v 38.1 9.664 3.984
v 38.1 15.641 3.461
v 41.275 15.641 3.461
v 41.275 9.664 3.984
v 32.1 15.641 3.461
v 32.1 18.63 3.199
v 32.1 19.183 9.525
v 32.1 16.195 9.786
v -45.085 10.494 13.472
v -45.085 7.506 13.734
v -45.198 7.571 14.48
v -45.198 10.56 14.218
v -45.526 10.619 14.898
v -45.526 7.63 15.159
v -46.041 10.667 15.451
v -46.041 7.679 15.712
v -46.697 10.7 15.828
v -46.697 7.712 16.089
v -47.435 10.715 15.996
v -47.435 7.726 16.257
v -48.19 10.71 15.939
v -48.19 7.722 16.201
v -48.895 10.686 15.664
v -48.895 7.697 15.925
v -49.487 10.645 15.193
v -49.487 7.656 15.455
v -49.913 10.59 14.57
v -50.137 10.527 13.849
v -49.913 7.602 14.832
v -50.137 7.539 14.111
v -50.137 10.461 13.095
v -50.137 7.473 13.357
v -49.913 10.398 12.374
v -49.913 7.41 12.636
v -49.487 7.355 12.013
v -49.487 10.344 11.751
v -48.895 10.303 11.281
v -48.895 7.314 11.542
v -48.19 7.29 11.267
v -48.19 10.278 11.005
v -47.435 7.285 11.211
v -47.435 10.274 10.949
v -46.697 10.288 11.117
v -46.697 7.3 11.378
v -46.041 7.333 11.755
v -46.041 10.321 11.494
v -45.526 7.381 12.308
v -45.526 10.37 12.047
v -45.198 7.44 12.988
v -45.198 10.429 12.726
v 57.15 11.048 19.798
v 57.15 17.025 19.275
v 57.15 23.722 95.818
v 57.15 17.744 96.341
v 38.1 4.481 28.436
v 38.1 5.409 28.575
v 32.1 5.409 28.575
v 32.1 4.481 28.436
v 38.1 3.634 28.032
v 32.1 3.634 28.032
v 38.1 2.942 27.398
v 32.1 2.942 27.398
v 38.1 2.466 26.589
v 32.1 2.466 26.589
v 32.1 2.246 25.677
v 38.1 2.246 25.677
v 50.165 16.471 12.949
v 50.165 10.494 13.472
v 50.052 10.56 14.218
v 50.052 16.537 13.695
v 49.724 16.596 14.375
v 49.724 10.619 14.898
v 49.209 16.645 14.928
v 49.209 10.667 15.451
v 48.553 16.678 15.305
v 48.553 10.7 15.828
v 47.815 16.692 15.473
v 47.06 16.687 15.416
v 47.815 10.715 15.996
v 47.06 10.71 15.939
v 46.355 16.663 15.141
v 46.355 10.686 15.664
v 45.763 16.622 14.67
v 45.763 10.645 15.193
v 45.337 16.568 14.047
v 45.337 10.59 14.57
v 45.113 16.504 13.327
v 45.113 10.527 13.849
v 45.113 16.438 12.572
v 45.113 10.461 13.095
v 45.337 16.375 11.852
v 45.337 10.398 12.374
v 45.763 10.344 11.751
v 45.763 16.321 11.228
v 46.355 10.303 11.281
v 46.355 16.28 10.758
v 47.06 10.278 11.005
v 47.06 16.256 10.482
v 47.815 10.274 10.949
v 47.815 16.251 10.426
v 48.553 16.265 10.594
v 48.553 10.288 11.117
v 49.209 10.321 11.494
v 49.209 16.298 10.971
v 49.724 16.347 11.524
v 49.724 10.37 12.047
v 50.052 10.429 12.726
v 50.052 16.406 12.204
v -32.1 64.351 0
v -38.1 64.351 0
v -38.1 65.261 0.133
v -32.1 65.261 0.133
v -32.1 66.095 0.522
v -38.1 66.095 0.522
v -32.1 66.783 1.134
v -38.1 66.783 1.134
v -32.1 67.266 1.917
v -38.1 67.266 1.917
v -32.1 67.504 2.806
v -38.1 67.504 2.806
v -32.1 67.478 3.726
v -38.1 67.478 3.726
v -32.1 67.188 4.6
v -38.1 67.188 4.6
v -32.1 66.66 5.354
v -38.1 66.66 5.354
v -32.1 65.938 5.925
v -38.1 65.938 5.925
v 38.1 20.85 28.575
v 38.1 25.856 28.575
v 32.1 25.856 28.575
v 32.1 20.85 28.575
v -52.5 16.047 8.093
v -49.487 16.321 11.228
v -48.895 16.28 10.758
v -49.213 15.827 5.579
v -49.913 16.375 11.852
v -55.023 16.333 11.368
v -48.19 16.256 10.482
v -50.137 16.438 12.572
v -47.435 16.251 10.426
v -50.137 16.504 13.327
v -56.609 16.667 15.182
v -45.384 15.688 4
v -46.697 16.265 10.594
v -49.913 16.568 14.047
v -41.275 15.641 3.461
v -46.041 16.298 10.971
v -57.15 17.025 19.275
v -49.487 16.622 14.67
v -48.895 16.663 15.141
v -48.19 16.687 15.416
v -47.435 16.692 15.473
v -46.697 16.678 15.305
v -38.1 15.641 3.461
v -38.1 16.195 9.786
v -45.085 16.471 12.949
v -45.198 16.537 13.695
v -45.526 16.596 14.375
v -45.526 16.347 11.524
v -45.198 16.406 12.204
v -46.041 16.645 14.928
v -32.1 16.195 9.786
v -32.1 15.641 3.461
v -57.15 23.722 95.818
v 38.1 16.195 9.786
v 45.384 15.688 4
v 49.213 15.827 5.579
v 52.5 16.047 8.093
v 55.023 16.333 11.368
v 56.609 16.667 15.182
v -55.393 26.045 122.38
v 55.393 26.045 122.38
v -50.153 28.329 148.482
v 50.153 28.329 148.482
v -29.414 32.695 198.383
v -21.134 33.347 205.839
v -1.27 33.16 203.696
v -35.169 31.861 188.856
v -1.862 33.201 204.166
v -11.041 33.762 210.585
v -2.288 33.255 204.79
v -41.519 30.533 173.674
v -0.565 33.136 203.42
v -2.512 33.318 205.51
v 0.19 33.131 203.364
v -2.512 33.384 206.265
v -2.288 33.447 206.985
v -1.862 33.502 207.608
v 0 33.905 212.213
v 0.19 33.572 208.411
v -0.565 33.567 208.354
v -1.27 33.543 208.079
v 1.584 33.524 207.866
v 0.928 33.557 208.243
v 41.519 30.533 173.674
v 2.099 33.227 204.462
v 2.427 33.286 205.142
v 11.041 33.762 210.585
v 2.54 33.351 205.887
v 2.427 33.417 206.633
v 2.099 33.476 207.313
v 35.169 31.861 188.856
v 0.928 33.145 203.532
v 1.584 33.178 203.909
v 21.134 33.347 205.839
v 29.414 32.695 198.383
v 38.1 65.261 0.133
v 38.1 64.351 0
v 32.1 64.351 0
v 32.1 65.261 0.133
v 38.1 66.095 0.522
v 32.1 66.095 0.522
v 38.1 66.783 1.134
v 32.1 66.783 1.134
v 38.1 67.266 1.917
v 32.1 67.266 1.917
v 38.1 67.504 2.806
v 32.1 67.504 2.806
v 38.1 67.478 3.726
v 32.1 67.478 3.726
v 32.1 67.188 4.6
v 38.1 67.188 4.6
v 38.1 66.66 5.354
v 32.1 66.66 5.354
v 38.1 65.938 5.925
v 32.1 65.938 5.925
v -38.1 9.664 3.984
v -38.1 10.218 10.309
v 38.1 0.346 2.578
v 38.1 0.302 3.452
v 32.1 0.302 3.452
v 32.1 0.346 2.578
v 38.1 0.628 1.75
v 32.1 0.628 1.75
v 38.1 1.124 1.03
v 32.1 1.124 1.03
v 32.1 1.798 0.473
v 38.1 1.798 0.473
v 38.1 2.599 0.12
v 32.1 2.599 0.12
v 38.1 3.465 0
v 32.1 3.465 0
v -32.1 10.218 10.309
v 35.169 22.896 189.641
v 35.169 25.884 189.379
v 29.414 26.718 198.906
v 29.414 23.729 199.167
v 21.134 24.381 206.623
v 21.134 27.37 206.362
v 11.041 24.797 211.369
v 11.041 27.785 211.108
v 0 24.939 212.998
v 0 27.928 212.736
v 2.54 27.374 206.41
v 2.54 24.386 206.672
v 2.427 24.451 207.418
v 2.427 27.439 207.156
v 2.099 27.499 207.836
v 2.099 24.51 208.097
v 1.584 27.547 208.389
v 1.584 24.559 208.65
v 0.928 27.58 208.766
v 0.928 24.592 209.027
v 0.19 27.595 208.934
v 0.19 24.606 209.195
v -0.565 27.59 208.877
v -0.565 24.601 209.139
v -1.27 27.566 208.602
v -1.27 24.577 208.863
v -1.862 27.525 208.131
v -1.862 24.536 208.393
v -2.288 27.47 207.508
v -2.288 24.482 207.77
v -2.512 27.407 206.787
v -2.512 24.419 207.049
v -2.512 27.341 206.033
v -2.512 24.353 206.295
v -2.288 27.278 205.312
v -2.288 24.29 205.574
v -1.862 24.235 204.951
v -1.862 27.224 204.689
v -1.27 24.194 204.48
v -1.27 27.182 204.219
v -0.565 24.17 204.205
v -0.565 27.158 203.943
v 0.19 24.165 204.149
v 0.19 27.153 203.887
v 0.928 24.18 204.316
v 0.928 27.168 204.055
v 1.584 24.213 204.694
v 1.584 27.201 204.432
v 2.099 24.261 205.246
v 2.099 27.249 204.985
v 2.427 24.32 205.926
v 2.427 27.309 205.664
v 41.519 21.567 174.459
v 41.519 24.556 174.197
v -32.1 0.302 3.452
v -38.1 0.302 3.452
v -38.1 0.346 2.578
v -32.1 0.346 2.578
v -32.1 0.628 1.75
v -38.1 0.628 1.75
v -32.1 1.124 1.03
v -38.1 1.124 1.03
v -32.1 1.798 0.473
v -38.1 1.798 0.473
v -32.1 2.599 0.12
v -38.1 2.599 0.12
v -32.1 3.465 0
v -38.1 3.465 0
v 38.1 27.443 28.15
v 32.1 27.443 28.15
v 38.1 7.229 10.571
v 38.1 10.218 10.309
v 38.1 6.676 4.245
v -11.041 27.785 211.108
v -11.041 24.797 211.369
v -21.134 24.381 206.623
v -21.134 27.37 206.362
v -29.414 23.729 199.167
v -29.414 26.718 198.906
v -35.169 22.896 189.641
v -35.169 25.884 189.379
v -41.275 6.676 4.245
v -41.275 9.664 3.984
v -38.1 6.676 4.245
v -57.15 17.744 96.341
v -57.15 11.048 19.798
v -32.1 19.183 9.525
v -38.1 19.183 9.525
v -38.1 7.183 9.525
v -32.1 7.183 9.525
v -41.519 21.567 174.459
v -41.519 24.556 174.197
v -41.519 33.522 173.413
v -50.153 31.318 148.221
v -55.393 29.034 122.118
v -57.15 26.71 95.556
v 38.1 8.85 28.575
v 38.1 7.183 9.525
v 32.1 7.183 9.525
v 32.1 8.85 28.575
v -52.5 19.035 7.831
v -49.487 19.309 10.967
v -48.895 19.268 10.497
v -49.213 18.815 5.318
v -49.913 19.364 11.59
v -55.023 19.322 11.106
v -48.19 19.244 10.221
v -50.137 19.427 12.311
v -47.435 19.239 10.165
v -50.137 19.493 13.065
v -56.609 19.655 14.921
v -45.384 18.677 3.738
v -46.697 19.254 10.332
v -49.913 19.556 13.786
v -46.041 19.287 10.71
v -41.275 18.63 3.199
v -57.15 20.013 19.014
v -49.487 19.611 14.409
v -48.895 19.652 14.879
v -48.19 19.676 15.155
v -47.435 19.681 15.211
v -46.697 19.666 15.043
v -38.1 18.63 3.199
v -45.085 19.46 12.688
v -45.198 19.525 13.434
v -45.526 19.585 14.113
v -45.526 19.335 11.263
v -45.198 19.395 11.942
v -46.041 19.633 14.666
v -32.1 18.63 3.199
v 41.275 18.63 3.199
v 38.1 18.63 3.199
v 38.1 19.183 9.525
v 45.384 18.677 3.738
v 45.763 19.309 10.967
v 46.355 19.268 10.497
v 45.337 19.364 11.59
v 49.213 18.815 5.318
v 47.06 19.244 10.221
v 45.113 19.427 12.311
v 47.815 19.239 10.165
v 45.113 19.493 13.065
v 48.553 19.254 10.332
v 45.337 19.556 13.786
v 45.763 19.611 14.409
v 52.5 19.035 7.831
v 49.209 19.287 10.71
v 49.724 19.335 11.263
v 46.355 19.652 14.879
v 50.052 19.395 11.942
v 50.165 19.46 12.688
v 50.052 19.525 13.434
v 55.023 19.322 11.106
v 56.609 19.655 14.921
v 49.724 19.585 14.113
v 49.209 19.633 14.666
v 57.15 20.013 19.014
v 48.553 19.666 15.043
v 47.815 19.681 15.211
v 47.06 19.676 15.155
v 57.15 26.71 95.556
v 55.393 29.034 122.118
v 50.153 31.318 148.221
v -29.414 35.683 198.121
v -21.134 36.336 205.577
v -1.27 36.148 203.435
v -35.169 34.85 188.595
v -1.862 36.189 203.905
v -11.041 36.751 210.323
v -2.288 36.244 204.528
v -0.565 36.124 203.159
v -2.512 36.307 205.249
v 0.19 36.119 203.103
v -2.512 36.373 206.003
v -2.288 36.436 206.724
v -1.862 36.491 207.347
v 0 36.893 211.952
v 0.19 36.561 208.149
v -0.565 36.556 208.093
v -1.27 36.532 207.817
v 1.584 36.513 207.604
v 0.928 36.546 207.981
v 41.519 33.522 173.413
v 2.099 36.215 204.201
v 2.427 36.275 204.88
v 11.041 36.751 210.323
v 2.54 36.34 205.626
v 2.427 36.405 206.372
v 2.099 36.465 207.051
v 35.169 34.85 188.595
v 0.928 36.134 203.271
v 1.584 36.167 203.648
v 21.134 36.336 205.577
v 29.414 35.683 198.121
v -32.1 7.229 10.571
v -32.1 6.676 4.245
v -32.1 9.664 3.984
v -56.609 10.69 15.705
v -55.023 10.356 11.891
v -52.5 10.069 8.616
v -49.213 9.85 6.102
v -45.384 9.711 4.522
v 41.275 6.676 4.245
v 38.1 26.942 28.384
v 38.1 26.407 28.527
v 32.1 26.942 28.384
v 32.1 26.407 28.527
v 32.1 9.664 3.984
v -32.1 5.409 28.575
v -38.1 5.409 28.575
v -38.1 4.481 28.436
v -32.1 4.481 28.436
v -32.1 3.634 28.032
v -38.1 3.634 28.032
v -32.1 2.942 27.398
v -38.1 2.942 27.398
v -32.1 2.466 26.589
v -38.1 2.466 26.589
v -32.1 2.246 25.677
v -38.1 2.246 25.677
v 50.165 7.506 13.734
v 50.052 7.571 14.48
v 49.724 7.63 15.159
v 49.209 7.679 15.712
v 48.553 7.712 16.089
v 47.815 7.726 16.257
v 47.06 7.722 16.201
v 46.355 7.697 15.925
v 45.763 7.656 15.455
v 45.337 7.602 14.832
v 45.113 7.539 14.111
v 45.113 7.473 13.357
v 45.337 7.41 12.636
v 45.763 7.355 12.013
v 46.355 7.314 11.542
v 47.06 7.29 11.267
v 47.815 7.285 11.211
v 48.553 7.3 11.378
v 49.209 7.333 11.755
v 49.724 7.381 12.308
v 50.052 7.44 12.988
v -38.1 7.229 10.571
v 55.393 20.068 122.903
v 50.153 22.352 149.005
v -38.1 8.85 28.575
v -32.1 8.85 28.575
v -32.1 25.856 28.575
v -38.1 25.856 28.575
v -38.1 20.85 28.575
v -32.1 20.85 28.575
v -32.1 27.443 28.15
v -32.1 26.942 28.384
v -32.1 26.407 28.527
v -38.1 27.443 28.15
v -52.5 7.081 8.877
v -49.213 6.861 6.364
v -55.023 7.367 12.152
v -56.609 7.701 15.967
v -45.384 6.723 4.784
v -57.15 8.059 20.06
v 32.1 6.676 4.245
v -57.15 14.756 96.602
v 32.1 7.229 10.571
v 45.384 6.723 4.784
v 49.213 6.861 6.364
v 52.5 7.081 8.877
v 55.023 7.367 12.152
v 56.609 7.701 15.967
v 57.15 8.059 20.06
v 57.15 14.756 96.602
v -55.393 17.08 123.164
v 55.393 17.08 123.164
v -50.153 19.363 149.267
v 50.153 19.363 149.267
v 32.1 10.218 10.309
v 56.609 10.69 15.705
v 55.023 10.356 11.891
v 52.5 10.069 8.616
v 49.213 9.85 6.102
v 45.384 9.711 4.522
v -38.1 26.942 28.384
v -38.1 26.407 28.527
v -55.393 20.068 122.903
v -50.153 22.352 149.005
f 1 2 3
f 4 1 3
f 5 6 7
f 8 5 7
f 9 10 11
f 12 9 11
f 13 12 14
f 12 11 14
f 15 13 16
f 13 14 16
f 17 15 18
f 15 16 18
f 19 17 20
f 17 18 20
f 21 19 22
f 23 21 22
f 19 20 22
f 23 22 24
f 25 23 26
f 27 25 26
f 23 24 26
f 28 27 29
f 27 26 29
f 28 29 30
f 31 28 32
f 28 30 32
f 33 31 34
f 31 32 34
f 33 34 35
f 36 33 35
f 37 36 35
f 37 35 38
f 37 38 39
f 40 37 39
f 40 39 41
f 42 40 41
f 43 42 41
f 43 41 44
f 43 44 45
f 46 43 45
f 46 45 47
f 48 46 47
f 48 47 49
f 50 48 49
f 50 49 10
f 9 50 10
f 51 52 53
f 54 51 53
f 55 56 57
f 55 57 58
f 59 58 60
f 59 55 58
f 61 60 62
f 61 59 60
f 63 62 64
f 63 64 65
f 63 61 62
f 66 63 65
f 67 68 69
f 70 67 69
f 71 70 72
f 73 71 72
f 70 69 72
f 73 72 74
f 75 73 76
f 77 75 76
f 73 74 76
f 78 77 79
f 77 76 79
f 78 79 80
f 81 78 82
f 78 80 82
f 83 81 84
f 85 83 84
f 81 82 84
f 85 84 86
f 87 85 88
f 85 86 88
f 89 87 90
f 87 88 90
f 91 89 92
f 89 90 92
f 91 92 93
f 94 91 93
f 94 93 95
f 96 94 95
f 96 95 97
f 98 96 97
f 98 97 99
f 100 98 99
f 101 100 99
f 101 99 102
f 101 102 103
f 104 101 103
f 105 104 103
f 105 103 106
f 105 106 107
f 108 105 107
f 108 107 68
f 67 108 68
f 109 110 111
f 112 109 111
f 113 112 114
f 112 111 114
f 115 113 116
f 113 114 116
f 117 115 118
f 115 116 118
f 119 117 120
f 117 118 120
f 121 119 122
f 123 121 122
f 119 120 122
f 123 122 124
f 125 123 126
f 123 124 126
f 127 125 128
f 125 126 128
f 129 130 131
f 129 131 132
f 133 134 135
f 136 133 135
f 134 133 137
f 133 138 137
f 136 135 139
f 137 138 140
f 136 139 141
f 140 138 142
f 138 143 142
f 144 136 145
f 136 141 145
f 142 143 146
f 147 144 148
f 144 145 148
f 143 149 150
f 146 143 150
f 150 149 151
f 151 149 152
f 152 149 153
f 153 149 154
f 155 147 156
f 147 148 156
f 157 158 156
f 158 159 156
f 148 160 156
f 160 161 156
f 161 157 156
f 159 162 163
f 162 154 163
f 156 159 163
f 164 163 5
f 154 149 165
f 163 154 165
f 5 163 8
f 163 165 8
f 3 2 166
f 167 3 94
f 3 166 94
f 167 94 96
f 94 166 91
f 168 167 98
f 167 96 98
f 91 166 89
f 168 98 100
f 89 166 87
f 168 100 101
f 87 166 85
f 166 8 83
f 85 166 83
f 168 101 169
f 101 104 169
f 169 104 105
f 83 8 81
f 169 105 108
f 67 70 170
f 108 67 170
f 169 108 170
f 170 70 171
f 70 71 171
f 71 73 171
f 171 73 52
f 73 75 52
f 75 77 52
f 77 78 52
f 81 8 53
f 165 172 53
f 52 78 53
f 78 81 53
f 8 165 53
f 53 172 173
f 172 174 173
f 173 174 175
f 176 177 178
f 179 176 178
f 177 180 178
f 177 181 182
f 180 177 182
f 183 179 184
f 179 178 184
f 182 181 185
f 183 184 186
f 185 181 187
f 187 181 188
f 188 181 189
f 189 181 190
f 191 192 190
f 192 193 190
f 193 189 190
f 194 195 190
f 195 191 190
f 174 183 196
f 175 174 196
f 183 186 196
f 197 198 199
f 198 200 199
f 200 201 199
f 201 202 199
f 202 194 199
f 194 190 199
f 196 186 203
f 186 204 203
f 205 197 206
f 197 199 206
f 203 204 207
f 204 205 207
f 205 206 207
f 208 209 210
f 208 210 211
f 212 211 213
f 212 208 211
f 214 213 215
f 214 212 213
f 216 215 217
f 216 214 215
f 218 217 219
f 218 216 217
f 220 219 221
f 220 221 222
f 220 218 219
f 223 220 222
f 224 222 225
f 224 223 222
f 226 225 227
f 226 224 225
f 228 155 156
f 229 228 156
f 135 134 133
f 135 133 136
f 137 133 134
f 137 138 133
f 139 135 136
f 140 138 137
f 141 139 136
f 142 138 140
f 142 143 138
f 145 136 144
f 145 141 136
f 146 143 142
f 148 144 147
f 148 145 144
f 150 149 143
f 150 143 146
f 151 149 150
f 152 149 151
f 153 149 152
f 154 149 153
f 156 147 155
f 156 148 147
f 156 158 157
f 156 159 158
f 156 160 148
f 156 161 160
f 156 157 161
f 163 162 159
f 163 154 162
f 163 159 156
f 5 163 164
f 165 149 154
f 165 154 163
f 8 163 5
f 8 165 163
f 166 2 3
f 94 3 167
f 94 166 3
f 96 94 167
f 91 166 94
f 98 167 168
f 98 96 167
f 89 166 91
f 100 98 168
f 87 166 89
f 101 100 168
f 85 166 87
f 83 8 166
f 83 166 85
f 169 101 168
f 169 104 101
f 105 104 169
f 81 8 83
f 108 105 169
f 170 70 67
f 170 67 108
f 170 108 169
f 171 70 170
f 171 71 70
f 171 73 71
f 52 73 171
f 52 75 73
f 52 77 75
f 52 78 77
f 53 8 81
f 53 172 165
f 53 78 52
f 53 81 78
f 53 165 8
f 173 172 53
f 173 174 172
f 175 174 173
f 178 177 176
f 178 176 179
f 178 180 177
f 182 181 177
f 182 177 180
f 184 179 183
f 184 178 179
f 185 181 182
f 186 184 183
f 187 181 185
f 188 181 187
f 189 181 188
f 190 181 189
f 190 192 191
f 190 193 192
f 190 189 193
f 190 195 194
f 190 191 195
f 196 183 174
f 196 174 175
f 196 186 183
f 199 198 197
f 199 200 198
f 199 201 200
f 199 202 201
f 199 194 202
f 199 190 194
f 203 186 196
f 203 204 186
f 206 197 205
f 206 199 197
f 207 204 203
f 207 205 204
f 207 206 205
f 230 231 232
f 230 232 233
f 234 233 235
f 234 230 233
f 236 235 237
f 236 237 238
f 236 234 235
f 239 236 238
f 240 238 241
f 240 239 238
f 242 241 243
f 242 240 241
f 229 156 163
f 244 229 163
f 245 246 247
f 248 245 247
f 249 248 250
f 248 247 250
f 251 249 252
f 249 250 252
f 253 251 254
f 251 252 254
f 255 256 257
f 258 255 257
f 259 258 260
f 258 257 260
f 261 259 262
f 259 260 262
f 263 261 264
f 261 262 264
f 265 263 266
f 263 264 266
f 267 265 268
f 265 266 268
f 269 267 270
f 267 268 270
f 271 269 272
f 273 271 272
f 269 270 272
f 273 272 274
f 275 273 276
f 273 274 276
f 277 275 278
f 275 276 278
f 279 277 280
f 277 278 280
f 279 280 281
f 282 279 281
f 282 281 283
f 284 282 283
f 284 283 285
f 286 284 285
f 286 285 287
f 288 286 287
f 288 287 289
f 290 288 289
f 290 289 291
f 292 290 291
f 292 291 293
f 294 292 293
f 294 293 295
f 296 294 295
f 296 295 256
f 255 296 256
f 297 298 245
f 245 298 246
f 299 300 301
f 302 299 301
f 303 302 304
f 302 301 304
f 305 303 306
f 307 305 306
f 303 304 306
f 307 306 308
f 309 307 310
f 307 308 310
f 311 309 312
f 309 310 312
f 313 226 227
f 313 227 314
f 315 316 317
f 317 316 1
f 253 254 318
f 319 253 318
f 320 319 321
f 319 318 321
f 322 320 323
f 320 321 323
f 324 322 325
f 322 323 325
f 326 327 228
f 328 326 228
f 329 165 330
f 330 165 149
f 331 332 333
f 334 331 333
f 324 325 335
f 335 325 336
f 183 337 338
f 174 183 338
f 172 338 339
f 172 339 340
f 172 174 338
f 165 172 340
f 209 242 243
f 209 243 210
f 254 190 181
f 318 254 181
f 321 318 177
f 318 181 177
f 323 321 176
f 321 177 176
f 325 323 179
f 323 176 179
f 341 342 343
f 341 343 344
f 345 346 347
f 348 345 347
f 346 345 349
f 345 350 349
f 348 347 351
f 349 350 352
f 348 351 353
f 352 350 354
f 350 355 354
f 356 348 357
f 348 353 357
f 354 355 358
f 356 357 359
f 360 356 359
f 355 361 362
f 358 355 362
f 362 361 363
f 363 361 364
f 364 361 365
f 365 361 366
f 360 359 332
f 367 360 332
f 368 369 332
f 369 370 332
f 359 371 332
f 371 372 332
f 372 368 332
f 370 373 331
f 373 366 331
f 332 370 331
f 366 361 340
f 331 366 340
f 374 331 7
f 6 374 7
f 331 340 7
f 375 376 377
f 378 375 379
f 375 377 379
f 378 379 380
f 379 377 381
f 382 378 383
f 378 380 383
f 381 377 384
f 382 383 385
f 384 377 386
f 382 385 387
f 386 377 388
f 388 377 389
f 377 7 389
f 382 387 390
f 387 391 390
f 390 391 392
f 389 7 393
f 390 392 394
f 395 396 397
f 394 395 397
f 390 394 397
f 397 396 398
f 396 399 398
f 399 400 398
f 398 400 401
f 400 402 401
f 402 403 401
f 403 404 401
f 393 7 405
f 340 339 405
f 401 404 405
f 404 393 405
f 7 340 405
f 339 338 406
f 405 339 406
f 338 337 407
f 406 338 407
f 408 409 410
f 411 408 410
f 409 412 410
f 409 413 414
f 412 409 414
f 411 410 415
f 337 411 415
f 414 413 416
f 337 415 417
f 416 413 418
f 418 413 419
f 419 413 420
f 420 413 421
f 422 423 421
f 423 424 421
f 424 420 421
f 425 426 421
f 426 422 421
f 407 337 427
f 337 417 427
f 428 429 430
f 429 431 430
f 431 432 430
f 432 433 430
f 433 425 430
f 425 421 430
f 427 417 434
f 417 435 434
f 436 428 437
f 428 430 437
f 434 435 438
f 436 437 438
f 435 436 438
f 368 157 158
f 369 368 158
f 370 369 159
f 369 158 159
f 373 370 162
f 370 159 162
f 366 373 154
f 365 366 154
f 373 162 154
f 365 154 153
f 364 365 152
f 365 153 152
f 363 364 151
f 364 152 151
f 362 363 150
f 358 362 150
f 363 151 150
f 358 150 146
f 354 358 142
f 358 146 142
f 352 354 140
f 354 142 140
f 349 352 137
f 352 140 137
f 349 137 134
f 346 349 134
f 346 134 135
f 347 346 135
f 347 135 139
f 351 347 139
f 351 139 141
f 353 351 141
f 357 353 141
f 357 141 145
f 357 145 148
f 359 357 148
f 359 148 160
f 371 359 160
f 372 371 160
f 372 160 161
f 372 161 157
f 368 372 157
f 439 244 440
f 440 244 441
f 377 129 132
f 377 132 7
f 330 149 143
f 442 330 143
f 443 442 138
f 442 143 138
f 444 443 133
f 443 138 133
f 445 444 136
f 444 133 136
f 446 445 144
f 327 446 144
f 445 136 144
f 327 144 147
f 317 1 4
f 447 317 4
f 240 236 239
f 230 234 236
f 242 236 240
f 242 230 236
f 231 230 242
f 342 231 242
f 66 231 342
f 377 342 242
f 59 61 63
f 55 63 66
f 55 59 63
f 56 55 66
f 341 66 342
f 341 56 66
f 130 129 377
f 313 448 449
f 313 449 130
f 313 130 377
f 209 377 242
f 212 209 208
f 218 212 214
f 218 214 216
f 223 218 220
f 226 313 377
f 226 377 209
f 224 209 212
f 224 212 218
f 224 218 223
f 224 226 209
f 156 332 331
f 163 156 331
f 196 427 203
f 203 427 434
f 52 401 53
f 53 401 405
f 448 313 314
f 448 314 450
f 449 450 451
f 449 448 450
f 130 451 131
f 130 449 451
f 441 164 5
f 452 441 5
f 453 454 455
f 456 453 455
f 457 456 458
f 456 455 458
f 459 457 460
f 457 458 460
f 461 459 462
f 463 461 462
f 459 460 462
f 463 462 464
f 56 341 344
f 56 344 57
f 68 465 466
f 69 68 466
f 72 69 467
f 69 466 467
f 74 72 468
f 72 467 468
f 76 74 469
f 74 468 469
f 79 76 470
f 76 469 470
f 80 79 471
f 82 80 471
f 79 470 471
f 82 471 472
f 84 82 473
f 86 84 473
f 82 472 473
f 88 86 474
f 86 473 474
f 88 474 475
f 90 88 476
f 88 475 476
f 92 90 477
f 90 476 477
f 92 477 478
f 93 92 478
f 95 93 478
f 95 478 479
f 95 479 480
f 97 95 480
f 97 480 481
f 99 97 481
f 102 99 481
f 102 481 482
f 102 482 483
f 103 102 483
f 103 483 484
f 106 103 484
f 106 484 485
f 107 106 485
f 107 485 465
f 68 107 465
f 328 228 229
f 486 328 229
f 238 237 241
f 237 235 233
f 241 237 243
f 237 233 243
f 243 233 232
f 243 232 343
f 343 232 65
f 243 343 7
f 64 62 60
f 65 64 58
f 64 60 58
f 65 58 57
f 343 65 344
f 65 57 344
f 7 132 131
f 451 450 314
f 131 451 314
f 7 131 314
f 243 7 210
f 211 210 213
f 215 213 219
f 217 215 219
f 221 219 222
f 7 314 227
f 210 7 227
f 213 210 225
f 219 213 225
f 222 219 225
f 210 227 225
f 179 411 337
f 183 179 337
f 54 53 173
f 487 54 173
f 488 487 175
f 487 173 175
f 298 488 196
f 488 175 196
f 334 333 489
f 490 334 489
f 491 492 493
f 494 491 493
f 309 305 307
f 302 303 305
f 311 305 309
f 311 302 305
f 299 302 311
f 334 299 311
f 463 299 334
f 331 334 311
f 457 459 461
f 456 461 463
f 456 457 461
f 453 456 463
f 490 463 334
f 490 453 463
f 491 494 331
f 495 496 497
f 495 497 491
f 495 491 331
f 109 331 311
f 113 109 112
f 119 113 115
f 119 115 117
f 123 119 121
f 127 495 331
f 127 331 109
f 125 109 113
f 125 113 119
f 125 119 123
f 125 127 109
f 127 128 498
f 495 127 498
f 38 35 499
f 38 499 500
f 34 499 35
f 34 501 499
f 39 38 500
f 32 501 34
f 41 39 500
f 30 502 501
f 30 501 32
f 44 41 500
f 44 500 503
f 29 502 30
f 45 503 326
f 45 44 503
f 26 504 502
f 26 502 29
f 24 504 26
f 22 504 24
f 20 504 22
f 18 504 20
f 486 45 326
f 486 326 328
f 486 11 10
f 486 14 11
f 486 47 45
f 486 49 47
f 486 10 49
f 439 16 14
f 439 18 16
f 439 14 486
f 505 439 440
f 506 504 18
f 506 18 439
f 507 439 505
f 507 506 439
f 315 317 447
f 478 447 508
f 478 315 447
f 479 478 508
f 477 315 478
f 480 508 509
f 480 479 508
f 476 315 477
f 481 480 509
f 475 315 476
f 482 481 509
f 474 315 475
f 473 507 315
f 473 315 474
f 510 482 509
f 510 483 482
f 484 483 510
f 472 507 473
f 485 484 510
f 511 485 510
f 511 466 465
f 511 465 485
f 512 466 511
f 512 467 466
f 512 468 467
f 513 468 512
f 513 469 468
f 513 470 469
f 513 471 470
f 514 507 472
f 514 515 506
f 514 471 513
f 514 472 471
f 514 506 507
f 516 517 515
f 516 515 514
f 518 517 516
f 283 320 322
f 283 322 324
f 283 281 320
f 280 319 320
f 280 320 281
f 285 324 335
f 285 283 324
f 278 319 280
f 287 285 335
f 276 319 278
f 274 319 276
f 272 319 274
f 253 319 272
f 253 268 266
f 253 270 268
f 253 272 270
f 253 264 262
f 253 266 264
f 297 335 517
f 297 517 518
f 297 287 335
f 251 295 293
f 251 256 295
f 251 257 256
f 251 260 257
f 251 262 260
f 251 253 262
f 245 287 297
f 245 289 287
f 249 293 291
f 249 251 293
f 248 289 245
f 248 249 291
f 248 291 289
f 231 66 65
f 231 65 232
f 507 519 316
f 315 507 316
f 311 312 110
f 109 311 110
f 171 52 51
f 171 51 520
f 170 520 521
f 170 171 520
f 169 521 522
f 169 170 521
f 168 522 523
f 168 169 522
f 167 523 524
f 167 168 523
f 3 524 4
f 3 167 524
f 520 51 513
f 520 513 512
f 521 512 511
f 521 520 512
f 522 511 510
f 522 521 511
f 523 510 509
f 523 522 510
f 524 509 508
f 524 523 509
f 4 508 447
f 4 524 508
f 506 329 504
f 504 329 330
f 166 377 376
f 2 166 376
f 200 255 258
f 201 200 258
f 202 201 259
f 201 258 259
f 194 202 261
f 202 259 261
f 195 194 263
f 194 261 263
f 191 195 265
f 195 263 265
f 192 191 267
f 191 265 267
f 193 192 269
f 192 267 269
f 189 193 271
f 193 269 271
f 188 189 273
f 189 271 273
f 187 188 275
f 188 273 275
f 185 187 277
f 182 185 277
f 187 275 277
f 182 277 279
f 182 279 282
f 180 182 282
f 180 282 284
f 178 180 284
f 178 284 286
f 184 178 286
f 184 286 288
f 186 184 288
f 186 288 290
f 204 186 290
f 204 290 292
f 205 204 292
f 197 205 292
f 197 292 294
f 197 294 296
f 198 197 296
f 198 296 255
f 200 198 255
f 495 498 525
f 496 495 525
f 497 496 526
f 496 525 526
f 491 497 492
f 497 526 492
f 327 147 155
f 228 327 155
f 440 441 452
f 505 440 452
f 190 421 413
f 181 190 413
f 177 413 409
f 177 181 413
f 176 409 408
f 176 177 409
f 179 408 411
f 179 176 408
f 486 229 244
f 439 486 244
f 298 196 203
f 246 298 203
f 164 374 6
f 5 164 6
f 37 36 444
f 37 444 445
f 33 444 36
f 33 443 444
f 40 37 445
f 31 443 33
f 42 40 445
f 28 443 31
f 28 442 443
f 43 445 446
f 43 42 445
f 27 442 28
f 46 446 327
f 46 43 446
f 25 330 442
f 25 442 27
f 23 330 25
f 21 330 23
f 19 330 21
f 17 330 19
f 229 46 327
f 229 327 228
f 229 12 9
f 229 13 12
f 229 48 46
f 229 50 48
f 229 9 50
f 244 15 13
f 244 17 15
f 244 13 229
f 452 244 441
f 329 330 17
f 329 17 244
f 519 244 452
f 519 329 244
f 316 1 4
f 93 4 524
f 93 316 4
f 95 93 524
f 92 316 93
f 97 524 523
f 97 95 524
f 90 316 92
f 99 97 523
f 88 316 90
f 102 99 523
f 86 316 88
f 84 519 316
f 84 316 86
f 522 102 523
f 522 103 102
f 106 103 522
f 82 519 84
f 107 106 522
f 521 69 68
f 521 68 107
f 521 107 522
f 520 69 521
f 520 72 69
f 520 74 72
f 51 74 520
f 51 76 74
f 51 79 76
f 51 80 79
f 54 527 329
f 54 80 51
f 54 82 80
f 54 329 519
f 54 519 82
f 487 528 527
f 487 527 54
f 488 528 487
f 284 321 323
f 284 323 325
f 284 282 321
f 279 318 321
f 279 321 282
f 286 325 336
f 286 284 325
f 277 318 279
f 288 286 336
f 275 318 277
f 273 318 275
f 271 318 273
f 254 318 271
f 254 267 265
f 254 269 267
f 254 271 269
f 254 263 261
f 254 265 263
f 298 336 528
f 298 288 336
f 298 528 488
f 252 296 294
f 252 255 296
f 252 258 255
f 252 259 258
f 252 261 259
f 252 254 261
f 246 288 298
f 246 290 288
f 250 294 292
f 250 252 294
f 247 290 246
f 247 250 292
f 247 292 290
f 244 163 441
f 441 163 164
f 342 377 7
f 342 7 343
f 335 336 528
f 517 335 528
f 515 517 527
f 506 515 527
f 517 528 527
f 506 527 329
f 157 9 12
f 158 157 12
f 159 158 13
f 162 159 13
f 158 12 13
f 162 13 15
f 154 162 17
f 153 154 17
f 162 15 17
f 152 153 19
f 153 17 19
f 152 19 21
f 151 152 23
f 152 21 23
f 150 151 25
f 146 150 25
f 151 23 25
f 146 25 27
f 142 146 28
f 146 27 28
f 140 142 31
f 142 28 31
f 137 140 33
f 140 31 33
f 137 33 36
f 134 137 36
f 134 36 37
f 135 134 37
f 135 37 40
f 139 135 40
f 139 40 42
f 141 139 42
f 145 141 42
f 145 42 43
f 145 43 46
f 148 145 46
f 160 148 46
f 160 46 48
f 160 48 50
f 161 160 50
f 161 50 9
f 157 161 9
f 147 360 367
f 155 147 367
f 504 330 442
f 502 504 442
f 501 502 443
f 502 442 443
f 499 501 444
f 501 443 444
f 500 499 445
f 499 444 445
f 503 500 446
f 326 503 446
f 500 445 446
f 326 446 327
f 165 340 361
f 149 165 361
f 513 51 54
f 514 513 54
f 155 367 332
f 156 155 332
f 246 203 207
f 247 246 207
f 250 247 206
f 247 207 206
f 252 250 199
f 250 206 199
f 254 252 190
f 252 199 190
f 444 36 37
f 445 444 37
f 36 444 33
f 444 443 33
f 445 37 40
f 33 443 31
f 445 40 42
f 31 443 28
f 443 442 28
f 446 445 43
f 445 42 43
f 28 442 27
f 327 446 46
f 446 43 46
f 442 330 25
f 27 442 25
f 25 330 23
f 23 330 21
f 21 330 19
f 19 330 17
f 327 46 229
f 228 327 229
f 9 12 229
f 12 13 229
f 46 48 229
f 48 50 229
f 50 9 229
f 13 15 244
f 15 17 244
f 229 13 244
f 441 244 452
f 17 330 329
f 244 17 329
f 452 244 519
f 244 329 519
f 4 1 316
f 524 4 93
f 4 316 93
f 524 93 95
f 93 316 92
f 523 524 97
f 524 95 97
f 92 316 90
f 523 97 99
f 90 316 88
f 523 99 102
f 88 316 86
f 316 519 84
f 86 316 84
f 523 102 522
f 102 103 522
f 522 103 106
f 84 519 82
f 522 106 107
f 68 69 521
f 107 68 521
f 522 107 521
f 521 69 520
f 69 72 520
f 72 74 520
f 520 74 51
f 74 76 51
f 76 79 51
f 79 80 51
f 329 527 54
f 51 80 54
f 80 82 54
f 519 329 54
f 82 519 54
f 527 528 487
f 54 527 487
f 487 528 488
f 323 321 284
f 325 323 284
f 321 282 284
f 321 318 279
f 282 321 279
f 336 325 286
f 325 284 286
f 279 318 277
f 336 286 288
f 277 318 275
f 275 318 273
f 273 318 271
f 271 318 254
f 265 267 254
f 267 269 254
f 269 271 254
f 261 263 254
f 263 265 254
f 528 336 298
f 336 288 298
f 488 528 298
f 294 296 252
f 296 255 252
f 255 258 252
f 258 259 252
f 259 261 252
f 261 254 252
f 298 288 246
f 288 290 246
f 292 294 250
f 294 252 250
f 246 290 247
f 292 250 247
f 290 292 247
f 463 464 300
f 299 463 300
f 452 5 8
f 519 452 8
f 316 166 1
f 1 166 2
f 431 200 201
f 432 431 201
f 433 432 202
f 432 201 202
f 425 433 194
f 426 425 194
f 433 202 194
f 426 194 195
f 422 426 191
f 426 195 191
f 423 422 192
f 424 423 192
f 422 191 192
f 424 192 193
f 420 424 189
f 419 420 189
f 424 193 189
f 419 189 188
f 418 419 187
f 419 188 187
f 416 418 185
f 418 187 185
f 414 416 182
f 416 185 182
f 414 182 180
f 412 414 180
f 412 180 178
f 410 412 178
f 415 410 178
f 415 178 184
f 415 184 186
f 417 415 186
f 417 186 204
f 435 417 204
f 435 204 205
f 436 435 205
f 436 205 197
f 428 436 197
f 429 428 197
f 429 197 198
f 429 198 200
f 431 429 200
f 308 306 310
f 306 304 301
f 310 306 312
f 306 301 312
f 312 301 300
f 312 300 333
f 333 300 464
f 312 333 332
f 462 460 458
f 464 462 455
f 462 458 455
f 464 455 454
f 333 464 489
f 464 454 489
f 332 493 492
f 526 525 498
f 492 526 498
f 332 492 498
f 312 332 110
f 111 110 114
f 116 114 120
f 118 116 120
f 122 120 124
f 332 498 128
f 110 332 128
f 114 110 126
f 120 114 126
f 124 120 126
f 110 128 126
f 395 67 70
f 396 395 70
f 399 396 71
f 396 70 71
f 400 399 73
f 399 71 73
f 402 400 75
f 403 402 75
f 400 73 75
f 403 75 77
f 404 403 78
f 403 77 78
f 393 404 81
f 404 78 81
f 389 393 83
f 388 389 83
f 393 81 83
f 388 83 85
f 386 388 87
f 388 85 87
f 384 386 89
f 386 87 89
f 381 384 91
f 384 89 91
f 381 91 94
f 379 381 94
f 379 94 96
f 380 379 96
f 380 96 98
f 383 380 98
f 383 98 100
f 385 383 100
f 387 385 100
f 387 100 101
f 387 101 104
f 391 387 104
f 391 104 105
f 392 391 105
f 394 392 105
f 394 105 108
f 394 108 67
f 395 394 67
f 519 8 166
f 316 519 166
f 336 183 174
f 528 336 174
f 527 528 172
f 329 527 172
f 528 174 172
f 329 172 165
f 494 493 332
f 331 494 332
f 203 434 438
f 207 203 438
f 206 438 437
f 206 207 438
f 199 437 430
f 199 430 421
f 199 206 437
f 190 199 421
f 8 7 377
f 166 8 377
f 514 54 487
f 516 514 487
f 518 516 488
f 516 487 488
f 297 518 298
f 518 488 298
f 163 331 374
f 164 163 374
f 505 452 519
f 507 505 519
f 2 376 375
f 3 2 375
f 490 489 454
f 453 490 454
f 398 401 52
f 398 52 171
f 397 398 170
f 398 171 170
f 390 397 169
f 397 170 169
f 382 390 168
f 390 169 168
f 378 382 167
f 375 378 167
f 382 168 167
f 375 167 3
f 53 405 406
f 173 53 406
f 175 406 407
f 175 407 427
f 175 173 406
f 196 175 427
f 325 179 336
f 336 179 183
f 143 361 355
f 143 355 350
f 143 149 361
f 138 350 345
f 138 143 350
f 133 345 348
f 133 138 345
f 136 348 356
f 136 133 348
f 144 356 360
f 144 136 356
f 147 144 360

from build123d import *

# Parameters (mm, degrees)
F2_DEPTH  = 6
F4_W      = 6
F4_H      = 19.1227679052
F5_DEPTH  = 3
F6_R      = 203.2
F7_R      = 38.09999
F8_R      = 15.875
F9_DEPTH  = 6
F10_DEPTH = 3
F11_R     = 2.54
F12_DEPTH = 25.4


# Not quite as in the source:
# - a fillet or chamfer is up to 0.001 mm smaller than in the source, because OpenCascade refuses the exact size


with BuildPart() as f2:
    # F1 (on offset) → F2 (new body)
    with BuildSketch(Plane.YZ.offset(-38.1)):
        with BuildLine():
            ThreePointArc((0.3019863245, 3.4517194832), (1.1240489465, 1.0300010908), (3.4649044909, 0))
            Line((3.4649044909, 0), (64.350738686, 0))
            ThreePointArc((64.350738686, 0), (67.4175531844, 2.3532495318), (65.938238686, 5.924630657))
            Line((65.938238686, 5.924630657), (27.4434094878, 28.149630657))
            ThreePointArc((27.4434094878, 28.149630657), (26.677659956, 28.4668144985), (25.8559094878, 28.575))
            Line((25.8559094878, 28.575), (20.8499885603, 28.575))
            Line((20.8499885603, 28.575), (19.1833295201, 9.525))
            Line((19.1833295201, 9.525), (7.1833295201, 9.525))
            Line((7.1833295201, 9.525), (8.8499885603, 28.575))
            Line((8.8499885603, 28.575), (5.4093400378, 28.575))
            ThreePointArc((5.4093400378, 28.575), (3.2643411286, 27.7408555444), (2.2464218713, 25.6767194832))
            Line((2.2464218713, 25.6767194832), (0.3019863245, 3.4517194832))
        make_face()
    extrude(amount=F2_DEPTH)


with BuildPart() as f3_1:
    # F3: instance of F2
    add(f2.part.mirror(Plane.YZ))


with BuildPart() as f5:
    # F4 (on face) → F5 (new body)
    with BuildSketch(Plane(origin=(0, 18.2106111339, -1.5932220301), x_dir=(1, 0, 0), z_dir=(0, -0.9961946981, 0.0871557427))):
        Polygon((32.1, 11.160691832), (38.1, 11.160691832), (38.1, 4.810691832), (57.15, 4.810691832), (57.15, 11.160691832), (57.15, 138.160691832), (25.4, 214.360691832), (-25.4, 214.360691832), (-57.15, 138.160691832), (-57.15, 11.160691832), (-57.15, 4.810691832), (-38.1, 4.810691832), (-38.1, 11.160691832), (-38.1, 30.2834597372), (-32.1, 30.2834597372), (-32.1, 11.160691832), (-32.1, 4.810691832), (32.1, 4.810691832), align=None)
        with Locations((-35.1, 20.7220757846)):
            Rectangle(F4_W, F4_H)
    extrude(amount=F5_DEPTH)

    # F6
    f6_edges = [f5.edges().sort_by_distance(p)[0] for p in [
        (-57.15, 28.757817, 136.17246),
        (57.15, 28.757817, 136.17246),
    ]]
    fillet(f6_edges, radius=F6_R)

    # F7 (radius 38.1 in the source; OpenCascade refuses exactly that, so slightly less here)
    f7_edges = [f5.edges().sort_by_distance(p)[0] for p in [
        (-25.4, 35.399084, 212.082496),
        (25.4, 35.399084, 212.082496),
    ]]
    fillet(f7_edges, radius=F7_R)

    # F8
    f8_edges = [f5.edges().sort_by_distance(p)[0] for p in [
        (-57.15, 17.135599, 3.329897),
        (57.15, 17.135599, 3.329897),
    ]]
    fillet(f8_edges, radius=F8_R)


with BuildPart() as f9:
    # F9 (new): a face of the model
    f9_faces = [f5.part.faces().sort_by_distance(p)[0] for p in [
        (0, 23.9302542283, 98.2037374296),
    ]]
    extrude(f9_faces, amount=F9_DEPTH)


with BuildPart() as f10:
    # F10 (new): a face of the model
    f10_faces = [f9.part.faces().sort_by_distance(p)[0] for p in [
        (0, 17.9530860398, 98.7266718861),
    ]]
    extrude(f10_faces, amount=F10_DEPTH)


with BuildPart() as f12_tool:
    # F11 (on face) → F12 (new body)
    with BuildSketch(Plane(origin=(0, 6.2562747568, -0.5473531171), x_dir=(1, 0, 0), z_dir=(0, -0.9961946981, 0.0871557427))):
        with Locations((-47.625, 14.335691832)):
            Circle(F11_R)
        with Locations((47.625, 14.335691832)):
            Circle(F11_R)
        with Locations((0, 208.010691832)):
            Circle(F11_R)
    extrude(amount=-F12_DEPTH)


with BuildPart() as f5_1:
    add(f5.part)

    # F12: cut by f12_tool
    add(f12_tool.part, mode=Mode.SUBTRACT)


with BuildPart() as f9_1:
    add(f9.part)

    # F12: cut by f12_tool
    add(f12_tool.part, mode=Mode.SUBTRACT)


with BuildPart() as f10_1:
    add(f10.part)

    # F12: cut by f12_tool
    add(f12_tool.part, mode=Mode.SUBTRACT)


solid = Compound([f2.part, f3_1.part, f5_1.part, f9_1.part, f10_1.part])
